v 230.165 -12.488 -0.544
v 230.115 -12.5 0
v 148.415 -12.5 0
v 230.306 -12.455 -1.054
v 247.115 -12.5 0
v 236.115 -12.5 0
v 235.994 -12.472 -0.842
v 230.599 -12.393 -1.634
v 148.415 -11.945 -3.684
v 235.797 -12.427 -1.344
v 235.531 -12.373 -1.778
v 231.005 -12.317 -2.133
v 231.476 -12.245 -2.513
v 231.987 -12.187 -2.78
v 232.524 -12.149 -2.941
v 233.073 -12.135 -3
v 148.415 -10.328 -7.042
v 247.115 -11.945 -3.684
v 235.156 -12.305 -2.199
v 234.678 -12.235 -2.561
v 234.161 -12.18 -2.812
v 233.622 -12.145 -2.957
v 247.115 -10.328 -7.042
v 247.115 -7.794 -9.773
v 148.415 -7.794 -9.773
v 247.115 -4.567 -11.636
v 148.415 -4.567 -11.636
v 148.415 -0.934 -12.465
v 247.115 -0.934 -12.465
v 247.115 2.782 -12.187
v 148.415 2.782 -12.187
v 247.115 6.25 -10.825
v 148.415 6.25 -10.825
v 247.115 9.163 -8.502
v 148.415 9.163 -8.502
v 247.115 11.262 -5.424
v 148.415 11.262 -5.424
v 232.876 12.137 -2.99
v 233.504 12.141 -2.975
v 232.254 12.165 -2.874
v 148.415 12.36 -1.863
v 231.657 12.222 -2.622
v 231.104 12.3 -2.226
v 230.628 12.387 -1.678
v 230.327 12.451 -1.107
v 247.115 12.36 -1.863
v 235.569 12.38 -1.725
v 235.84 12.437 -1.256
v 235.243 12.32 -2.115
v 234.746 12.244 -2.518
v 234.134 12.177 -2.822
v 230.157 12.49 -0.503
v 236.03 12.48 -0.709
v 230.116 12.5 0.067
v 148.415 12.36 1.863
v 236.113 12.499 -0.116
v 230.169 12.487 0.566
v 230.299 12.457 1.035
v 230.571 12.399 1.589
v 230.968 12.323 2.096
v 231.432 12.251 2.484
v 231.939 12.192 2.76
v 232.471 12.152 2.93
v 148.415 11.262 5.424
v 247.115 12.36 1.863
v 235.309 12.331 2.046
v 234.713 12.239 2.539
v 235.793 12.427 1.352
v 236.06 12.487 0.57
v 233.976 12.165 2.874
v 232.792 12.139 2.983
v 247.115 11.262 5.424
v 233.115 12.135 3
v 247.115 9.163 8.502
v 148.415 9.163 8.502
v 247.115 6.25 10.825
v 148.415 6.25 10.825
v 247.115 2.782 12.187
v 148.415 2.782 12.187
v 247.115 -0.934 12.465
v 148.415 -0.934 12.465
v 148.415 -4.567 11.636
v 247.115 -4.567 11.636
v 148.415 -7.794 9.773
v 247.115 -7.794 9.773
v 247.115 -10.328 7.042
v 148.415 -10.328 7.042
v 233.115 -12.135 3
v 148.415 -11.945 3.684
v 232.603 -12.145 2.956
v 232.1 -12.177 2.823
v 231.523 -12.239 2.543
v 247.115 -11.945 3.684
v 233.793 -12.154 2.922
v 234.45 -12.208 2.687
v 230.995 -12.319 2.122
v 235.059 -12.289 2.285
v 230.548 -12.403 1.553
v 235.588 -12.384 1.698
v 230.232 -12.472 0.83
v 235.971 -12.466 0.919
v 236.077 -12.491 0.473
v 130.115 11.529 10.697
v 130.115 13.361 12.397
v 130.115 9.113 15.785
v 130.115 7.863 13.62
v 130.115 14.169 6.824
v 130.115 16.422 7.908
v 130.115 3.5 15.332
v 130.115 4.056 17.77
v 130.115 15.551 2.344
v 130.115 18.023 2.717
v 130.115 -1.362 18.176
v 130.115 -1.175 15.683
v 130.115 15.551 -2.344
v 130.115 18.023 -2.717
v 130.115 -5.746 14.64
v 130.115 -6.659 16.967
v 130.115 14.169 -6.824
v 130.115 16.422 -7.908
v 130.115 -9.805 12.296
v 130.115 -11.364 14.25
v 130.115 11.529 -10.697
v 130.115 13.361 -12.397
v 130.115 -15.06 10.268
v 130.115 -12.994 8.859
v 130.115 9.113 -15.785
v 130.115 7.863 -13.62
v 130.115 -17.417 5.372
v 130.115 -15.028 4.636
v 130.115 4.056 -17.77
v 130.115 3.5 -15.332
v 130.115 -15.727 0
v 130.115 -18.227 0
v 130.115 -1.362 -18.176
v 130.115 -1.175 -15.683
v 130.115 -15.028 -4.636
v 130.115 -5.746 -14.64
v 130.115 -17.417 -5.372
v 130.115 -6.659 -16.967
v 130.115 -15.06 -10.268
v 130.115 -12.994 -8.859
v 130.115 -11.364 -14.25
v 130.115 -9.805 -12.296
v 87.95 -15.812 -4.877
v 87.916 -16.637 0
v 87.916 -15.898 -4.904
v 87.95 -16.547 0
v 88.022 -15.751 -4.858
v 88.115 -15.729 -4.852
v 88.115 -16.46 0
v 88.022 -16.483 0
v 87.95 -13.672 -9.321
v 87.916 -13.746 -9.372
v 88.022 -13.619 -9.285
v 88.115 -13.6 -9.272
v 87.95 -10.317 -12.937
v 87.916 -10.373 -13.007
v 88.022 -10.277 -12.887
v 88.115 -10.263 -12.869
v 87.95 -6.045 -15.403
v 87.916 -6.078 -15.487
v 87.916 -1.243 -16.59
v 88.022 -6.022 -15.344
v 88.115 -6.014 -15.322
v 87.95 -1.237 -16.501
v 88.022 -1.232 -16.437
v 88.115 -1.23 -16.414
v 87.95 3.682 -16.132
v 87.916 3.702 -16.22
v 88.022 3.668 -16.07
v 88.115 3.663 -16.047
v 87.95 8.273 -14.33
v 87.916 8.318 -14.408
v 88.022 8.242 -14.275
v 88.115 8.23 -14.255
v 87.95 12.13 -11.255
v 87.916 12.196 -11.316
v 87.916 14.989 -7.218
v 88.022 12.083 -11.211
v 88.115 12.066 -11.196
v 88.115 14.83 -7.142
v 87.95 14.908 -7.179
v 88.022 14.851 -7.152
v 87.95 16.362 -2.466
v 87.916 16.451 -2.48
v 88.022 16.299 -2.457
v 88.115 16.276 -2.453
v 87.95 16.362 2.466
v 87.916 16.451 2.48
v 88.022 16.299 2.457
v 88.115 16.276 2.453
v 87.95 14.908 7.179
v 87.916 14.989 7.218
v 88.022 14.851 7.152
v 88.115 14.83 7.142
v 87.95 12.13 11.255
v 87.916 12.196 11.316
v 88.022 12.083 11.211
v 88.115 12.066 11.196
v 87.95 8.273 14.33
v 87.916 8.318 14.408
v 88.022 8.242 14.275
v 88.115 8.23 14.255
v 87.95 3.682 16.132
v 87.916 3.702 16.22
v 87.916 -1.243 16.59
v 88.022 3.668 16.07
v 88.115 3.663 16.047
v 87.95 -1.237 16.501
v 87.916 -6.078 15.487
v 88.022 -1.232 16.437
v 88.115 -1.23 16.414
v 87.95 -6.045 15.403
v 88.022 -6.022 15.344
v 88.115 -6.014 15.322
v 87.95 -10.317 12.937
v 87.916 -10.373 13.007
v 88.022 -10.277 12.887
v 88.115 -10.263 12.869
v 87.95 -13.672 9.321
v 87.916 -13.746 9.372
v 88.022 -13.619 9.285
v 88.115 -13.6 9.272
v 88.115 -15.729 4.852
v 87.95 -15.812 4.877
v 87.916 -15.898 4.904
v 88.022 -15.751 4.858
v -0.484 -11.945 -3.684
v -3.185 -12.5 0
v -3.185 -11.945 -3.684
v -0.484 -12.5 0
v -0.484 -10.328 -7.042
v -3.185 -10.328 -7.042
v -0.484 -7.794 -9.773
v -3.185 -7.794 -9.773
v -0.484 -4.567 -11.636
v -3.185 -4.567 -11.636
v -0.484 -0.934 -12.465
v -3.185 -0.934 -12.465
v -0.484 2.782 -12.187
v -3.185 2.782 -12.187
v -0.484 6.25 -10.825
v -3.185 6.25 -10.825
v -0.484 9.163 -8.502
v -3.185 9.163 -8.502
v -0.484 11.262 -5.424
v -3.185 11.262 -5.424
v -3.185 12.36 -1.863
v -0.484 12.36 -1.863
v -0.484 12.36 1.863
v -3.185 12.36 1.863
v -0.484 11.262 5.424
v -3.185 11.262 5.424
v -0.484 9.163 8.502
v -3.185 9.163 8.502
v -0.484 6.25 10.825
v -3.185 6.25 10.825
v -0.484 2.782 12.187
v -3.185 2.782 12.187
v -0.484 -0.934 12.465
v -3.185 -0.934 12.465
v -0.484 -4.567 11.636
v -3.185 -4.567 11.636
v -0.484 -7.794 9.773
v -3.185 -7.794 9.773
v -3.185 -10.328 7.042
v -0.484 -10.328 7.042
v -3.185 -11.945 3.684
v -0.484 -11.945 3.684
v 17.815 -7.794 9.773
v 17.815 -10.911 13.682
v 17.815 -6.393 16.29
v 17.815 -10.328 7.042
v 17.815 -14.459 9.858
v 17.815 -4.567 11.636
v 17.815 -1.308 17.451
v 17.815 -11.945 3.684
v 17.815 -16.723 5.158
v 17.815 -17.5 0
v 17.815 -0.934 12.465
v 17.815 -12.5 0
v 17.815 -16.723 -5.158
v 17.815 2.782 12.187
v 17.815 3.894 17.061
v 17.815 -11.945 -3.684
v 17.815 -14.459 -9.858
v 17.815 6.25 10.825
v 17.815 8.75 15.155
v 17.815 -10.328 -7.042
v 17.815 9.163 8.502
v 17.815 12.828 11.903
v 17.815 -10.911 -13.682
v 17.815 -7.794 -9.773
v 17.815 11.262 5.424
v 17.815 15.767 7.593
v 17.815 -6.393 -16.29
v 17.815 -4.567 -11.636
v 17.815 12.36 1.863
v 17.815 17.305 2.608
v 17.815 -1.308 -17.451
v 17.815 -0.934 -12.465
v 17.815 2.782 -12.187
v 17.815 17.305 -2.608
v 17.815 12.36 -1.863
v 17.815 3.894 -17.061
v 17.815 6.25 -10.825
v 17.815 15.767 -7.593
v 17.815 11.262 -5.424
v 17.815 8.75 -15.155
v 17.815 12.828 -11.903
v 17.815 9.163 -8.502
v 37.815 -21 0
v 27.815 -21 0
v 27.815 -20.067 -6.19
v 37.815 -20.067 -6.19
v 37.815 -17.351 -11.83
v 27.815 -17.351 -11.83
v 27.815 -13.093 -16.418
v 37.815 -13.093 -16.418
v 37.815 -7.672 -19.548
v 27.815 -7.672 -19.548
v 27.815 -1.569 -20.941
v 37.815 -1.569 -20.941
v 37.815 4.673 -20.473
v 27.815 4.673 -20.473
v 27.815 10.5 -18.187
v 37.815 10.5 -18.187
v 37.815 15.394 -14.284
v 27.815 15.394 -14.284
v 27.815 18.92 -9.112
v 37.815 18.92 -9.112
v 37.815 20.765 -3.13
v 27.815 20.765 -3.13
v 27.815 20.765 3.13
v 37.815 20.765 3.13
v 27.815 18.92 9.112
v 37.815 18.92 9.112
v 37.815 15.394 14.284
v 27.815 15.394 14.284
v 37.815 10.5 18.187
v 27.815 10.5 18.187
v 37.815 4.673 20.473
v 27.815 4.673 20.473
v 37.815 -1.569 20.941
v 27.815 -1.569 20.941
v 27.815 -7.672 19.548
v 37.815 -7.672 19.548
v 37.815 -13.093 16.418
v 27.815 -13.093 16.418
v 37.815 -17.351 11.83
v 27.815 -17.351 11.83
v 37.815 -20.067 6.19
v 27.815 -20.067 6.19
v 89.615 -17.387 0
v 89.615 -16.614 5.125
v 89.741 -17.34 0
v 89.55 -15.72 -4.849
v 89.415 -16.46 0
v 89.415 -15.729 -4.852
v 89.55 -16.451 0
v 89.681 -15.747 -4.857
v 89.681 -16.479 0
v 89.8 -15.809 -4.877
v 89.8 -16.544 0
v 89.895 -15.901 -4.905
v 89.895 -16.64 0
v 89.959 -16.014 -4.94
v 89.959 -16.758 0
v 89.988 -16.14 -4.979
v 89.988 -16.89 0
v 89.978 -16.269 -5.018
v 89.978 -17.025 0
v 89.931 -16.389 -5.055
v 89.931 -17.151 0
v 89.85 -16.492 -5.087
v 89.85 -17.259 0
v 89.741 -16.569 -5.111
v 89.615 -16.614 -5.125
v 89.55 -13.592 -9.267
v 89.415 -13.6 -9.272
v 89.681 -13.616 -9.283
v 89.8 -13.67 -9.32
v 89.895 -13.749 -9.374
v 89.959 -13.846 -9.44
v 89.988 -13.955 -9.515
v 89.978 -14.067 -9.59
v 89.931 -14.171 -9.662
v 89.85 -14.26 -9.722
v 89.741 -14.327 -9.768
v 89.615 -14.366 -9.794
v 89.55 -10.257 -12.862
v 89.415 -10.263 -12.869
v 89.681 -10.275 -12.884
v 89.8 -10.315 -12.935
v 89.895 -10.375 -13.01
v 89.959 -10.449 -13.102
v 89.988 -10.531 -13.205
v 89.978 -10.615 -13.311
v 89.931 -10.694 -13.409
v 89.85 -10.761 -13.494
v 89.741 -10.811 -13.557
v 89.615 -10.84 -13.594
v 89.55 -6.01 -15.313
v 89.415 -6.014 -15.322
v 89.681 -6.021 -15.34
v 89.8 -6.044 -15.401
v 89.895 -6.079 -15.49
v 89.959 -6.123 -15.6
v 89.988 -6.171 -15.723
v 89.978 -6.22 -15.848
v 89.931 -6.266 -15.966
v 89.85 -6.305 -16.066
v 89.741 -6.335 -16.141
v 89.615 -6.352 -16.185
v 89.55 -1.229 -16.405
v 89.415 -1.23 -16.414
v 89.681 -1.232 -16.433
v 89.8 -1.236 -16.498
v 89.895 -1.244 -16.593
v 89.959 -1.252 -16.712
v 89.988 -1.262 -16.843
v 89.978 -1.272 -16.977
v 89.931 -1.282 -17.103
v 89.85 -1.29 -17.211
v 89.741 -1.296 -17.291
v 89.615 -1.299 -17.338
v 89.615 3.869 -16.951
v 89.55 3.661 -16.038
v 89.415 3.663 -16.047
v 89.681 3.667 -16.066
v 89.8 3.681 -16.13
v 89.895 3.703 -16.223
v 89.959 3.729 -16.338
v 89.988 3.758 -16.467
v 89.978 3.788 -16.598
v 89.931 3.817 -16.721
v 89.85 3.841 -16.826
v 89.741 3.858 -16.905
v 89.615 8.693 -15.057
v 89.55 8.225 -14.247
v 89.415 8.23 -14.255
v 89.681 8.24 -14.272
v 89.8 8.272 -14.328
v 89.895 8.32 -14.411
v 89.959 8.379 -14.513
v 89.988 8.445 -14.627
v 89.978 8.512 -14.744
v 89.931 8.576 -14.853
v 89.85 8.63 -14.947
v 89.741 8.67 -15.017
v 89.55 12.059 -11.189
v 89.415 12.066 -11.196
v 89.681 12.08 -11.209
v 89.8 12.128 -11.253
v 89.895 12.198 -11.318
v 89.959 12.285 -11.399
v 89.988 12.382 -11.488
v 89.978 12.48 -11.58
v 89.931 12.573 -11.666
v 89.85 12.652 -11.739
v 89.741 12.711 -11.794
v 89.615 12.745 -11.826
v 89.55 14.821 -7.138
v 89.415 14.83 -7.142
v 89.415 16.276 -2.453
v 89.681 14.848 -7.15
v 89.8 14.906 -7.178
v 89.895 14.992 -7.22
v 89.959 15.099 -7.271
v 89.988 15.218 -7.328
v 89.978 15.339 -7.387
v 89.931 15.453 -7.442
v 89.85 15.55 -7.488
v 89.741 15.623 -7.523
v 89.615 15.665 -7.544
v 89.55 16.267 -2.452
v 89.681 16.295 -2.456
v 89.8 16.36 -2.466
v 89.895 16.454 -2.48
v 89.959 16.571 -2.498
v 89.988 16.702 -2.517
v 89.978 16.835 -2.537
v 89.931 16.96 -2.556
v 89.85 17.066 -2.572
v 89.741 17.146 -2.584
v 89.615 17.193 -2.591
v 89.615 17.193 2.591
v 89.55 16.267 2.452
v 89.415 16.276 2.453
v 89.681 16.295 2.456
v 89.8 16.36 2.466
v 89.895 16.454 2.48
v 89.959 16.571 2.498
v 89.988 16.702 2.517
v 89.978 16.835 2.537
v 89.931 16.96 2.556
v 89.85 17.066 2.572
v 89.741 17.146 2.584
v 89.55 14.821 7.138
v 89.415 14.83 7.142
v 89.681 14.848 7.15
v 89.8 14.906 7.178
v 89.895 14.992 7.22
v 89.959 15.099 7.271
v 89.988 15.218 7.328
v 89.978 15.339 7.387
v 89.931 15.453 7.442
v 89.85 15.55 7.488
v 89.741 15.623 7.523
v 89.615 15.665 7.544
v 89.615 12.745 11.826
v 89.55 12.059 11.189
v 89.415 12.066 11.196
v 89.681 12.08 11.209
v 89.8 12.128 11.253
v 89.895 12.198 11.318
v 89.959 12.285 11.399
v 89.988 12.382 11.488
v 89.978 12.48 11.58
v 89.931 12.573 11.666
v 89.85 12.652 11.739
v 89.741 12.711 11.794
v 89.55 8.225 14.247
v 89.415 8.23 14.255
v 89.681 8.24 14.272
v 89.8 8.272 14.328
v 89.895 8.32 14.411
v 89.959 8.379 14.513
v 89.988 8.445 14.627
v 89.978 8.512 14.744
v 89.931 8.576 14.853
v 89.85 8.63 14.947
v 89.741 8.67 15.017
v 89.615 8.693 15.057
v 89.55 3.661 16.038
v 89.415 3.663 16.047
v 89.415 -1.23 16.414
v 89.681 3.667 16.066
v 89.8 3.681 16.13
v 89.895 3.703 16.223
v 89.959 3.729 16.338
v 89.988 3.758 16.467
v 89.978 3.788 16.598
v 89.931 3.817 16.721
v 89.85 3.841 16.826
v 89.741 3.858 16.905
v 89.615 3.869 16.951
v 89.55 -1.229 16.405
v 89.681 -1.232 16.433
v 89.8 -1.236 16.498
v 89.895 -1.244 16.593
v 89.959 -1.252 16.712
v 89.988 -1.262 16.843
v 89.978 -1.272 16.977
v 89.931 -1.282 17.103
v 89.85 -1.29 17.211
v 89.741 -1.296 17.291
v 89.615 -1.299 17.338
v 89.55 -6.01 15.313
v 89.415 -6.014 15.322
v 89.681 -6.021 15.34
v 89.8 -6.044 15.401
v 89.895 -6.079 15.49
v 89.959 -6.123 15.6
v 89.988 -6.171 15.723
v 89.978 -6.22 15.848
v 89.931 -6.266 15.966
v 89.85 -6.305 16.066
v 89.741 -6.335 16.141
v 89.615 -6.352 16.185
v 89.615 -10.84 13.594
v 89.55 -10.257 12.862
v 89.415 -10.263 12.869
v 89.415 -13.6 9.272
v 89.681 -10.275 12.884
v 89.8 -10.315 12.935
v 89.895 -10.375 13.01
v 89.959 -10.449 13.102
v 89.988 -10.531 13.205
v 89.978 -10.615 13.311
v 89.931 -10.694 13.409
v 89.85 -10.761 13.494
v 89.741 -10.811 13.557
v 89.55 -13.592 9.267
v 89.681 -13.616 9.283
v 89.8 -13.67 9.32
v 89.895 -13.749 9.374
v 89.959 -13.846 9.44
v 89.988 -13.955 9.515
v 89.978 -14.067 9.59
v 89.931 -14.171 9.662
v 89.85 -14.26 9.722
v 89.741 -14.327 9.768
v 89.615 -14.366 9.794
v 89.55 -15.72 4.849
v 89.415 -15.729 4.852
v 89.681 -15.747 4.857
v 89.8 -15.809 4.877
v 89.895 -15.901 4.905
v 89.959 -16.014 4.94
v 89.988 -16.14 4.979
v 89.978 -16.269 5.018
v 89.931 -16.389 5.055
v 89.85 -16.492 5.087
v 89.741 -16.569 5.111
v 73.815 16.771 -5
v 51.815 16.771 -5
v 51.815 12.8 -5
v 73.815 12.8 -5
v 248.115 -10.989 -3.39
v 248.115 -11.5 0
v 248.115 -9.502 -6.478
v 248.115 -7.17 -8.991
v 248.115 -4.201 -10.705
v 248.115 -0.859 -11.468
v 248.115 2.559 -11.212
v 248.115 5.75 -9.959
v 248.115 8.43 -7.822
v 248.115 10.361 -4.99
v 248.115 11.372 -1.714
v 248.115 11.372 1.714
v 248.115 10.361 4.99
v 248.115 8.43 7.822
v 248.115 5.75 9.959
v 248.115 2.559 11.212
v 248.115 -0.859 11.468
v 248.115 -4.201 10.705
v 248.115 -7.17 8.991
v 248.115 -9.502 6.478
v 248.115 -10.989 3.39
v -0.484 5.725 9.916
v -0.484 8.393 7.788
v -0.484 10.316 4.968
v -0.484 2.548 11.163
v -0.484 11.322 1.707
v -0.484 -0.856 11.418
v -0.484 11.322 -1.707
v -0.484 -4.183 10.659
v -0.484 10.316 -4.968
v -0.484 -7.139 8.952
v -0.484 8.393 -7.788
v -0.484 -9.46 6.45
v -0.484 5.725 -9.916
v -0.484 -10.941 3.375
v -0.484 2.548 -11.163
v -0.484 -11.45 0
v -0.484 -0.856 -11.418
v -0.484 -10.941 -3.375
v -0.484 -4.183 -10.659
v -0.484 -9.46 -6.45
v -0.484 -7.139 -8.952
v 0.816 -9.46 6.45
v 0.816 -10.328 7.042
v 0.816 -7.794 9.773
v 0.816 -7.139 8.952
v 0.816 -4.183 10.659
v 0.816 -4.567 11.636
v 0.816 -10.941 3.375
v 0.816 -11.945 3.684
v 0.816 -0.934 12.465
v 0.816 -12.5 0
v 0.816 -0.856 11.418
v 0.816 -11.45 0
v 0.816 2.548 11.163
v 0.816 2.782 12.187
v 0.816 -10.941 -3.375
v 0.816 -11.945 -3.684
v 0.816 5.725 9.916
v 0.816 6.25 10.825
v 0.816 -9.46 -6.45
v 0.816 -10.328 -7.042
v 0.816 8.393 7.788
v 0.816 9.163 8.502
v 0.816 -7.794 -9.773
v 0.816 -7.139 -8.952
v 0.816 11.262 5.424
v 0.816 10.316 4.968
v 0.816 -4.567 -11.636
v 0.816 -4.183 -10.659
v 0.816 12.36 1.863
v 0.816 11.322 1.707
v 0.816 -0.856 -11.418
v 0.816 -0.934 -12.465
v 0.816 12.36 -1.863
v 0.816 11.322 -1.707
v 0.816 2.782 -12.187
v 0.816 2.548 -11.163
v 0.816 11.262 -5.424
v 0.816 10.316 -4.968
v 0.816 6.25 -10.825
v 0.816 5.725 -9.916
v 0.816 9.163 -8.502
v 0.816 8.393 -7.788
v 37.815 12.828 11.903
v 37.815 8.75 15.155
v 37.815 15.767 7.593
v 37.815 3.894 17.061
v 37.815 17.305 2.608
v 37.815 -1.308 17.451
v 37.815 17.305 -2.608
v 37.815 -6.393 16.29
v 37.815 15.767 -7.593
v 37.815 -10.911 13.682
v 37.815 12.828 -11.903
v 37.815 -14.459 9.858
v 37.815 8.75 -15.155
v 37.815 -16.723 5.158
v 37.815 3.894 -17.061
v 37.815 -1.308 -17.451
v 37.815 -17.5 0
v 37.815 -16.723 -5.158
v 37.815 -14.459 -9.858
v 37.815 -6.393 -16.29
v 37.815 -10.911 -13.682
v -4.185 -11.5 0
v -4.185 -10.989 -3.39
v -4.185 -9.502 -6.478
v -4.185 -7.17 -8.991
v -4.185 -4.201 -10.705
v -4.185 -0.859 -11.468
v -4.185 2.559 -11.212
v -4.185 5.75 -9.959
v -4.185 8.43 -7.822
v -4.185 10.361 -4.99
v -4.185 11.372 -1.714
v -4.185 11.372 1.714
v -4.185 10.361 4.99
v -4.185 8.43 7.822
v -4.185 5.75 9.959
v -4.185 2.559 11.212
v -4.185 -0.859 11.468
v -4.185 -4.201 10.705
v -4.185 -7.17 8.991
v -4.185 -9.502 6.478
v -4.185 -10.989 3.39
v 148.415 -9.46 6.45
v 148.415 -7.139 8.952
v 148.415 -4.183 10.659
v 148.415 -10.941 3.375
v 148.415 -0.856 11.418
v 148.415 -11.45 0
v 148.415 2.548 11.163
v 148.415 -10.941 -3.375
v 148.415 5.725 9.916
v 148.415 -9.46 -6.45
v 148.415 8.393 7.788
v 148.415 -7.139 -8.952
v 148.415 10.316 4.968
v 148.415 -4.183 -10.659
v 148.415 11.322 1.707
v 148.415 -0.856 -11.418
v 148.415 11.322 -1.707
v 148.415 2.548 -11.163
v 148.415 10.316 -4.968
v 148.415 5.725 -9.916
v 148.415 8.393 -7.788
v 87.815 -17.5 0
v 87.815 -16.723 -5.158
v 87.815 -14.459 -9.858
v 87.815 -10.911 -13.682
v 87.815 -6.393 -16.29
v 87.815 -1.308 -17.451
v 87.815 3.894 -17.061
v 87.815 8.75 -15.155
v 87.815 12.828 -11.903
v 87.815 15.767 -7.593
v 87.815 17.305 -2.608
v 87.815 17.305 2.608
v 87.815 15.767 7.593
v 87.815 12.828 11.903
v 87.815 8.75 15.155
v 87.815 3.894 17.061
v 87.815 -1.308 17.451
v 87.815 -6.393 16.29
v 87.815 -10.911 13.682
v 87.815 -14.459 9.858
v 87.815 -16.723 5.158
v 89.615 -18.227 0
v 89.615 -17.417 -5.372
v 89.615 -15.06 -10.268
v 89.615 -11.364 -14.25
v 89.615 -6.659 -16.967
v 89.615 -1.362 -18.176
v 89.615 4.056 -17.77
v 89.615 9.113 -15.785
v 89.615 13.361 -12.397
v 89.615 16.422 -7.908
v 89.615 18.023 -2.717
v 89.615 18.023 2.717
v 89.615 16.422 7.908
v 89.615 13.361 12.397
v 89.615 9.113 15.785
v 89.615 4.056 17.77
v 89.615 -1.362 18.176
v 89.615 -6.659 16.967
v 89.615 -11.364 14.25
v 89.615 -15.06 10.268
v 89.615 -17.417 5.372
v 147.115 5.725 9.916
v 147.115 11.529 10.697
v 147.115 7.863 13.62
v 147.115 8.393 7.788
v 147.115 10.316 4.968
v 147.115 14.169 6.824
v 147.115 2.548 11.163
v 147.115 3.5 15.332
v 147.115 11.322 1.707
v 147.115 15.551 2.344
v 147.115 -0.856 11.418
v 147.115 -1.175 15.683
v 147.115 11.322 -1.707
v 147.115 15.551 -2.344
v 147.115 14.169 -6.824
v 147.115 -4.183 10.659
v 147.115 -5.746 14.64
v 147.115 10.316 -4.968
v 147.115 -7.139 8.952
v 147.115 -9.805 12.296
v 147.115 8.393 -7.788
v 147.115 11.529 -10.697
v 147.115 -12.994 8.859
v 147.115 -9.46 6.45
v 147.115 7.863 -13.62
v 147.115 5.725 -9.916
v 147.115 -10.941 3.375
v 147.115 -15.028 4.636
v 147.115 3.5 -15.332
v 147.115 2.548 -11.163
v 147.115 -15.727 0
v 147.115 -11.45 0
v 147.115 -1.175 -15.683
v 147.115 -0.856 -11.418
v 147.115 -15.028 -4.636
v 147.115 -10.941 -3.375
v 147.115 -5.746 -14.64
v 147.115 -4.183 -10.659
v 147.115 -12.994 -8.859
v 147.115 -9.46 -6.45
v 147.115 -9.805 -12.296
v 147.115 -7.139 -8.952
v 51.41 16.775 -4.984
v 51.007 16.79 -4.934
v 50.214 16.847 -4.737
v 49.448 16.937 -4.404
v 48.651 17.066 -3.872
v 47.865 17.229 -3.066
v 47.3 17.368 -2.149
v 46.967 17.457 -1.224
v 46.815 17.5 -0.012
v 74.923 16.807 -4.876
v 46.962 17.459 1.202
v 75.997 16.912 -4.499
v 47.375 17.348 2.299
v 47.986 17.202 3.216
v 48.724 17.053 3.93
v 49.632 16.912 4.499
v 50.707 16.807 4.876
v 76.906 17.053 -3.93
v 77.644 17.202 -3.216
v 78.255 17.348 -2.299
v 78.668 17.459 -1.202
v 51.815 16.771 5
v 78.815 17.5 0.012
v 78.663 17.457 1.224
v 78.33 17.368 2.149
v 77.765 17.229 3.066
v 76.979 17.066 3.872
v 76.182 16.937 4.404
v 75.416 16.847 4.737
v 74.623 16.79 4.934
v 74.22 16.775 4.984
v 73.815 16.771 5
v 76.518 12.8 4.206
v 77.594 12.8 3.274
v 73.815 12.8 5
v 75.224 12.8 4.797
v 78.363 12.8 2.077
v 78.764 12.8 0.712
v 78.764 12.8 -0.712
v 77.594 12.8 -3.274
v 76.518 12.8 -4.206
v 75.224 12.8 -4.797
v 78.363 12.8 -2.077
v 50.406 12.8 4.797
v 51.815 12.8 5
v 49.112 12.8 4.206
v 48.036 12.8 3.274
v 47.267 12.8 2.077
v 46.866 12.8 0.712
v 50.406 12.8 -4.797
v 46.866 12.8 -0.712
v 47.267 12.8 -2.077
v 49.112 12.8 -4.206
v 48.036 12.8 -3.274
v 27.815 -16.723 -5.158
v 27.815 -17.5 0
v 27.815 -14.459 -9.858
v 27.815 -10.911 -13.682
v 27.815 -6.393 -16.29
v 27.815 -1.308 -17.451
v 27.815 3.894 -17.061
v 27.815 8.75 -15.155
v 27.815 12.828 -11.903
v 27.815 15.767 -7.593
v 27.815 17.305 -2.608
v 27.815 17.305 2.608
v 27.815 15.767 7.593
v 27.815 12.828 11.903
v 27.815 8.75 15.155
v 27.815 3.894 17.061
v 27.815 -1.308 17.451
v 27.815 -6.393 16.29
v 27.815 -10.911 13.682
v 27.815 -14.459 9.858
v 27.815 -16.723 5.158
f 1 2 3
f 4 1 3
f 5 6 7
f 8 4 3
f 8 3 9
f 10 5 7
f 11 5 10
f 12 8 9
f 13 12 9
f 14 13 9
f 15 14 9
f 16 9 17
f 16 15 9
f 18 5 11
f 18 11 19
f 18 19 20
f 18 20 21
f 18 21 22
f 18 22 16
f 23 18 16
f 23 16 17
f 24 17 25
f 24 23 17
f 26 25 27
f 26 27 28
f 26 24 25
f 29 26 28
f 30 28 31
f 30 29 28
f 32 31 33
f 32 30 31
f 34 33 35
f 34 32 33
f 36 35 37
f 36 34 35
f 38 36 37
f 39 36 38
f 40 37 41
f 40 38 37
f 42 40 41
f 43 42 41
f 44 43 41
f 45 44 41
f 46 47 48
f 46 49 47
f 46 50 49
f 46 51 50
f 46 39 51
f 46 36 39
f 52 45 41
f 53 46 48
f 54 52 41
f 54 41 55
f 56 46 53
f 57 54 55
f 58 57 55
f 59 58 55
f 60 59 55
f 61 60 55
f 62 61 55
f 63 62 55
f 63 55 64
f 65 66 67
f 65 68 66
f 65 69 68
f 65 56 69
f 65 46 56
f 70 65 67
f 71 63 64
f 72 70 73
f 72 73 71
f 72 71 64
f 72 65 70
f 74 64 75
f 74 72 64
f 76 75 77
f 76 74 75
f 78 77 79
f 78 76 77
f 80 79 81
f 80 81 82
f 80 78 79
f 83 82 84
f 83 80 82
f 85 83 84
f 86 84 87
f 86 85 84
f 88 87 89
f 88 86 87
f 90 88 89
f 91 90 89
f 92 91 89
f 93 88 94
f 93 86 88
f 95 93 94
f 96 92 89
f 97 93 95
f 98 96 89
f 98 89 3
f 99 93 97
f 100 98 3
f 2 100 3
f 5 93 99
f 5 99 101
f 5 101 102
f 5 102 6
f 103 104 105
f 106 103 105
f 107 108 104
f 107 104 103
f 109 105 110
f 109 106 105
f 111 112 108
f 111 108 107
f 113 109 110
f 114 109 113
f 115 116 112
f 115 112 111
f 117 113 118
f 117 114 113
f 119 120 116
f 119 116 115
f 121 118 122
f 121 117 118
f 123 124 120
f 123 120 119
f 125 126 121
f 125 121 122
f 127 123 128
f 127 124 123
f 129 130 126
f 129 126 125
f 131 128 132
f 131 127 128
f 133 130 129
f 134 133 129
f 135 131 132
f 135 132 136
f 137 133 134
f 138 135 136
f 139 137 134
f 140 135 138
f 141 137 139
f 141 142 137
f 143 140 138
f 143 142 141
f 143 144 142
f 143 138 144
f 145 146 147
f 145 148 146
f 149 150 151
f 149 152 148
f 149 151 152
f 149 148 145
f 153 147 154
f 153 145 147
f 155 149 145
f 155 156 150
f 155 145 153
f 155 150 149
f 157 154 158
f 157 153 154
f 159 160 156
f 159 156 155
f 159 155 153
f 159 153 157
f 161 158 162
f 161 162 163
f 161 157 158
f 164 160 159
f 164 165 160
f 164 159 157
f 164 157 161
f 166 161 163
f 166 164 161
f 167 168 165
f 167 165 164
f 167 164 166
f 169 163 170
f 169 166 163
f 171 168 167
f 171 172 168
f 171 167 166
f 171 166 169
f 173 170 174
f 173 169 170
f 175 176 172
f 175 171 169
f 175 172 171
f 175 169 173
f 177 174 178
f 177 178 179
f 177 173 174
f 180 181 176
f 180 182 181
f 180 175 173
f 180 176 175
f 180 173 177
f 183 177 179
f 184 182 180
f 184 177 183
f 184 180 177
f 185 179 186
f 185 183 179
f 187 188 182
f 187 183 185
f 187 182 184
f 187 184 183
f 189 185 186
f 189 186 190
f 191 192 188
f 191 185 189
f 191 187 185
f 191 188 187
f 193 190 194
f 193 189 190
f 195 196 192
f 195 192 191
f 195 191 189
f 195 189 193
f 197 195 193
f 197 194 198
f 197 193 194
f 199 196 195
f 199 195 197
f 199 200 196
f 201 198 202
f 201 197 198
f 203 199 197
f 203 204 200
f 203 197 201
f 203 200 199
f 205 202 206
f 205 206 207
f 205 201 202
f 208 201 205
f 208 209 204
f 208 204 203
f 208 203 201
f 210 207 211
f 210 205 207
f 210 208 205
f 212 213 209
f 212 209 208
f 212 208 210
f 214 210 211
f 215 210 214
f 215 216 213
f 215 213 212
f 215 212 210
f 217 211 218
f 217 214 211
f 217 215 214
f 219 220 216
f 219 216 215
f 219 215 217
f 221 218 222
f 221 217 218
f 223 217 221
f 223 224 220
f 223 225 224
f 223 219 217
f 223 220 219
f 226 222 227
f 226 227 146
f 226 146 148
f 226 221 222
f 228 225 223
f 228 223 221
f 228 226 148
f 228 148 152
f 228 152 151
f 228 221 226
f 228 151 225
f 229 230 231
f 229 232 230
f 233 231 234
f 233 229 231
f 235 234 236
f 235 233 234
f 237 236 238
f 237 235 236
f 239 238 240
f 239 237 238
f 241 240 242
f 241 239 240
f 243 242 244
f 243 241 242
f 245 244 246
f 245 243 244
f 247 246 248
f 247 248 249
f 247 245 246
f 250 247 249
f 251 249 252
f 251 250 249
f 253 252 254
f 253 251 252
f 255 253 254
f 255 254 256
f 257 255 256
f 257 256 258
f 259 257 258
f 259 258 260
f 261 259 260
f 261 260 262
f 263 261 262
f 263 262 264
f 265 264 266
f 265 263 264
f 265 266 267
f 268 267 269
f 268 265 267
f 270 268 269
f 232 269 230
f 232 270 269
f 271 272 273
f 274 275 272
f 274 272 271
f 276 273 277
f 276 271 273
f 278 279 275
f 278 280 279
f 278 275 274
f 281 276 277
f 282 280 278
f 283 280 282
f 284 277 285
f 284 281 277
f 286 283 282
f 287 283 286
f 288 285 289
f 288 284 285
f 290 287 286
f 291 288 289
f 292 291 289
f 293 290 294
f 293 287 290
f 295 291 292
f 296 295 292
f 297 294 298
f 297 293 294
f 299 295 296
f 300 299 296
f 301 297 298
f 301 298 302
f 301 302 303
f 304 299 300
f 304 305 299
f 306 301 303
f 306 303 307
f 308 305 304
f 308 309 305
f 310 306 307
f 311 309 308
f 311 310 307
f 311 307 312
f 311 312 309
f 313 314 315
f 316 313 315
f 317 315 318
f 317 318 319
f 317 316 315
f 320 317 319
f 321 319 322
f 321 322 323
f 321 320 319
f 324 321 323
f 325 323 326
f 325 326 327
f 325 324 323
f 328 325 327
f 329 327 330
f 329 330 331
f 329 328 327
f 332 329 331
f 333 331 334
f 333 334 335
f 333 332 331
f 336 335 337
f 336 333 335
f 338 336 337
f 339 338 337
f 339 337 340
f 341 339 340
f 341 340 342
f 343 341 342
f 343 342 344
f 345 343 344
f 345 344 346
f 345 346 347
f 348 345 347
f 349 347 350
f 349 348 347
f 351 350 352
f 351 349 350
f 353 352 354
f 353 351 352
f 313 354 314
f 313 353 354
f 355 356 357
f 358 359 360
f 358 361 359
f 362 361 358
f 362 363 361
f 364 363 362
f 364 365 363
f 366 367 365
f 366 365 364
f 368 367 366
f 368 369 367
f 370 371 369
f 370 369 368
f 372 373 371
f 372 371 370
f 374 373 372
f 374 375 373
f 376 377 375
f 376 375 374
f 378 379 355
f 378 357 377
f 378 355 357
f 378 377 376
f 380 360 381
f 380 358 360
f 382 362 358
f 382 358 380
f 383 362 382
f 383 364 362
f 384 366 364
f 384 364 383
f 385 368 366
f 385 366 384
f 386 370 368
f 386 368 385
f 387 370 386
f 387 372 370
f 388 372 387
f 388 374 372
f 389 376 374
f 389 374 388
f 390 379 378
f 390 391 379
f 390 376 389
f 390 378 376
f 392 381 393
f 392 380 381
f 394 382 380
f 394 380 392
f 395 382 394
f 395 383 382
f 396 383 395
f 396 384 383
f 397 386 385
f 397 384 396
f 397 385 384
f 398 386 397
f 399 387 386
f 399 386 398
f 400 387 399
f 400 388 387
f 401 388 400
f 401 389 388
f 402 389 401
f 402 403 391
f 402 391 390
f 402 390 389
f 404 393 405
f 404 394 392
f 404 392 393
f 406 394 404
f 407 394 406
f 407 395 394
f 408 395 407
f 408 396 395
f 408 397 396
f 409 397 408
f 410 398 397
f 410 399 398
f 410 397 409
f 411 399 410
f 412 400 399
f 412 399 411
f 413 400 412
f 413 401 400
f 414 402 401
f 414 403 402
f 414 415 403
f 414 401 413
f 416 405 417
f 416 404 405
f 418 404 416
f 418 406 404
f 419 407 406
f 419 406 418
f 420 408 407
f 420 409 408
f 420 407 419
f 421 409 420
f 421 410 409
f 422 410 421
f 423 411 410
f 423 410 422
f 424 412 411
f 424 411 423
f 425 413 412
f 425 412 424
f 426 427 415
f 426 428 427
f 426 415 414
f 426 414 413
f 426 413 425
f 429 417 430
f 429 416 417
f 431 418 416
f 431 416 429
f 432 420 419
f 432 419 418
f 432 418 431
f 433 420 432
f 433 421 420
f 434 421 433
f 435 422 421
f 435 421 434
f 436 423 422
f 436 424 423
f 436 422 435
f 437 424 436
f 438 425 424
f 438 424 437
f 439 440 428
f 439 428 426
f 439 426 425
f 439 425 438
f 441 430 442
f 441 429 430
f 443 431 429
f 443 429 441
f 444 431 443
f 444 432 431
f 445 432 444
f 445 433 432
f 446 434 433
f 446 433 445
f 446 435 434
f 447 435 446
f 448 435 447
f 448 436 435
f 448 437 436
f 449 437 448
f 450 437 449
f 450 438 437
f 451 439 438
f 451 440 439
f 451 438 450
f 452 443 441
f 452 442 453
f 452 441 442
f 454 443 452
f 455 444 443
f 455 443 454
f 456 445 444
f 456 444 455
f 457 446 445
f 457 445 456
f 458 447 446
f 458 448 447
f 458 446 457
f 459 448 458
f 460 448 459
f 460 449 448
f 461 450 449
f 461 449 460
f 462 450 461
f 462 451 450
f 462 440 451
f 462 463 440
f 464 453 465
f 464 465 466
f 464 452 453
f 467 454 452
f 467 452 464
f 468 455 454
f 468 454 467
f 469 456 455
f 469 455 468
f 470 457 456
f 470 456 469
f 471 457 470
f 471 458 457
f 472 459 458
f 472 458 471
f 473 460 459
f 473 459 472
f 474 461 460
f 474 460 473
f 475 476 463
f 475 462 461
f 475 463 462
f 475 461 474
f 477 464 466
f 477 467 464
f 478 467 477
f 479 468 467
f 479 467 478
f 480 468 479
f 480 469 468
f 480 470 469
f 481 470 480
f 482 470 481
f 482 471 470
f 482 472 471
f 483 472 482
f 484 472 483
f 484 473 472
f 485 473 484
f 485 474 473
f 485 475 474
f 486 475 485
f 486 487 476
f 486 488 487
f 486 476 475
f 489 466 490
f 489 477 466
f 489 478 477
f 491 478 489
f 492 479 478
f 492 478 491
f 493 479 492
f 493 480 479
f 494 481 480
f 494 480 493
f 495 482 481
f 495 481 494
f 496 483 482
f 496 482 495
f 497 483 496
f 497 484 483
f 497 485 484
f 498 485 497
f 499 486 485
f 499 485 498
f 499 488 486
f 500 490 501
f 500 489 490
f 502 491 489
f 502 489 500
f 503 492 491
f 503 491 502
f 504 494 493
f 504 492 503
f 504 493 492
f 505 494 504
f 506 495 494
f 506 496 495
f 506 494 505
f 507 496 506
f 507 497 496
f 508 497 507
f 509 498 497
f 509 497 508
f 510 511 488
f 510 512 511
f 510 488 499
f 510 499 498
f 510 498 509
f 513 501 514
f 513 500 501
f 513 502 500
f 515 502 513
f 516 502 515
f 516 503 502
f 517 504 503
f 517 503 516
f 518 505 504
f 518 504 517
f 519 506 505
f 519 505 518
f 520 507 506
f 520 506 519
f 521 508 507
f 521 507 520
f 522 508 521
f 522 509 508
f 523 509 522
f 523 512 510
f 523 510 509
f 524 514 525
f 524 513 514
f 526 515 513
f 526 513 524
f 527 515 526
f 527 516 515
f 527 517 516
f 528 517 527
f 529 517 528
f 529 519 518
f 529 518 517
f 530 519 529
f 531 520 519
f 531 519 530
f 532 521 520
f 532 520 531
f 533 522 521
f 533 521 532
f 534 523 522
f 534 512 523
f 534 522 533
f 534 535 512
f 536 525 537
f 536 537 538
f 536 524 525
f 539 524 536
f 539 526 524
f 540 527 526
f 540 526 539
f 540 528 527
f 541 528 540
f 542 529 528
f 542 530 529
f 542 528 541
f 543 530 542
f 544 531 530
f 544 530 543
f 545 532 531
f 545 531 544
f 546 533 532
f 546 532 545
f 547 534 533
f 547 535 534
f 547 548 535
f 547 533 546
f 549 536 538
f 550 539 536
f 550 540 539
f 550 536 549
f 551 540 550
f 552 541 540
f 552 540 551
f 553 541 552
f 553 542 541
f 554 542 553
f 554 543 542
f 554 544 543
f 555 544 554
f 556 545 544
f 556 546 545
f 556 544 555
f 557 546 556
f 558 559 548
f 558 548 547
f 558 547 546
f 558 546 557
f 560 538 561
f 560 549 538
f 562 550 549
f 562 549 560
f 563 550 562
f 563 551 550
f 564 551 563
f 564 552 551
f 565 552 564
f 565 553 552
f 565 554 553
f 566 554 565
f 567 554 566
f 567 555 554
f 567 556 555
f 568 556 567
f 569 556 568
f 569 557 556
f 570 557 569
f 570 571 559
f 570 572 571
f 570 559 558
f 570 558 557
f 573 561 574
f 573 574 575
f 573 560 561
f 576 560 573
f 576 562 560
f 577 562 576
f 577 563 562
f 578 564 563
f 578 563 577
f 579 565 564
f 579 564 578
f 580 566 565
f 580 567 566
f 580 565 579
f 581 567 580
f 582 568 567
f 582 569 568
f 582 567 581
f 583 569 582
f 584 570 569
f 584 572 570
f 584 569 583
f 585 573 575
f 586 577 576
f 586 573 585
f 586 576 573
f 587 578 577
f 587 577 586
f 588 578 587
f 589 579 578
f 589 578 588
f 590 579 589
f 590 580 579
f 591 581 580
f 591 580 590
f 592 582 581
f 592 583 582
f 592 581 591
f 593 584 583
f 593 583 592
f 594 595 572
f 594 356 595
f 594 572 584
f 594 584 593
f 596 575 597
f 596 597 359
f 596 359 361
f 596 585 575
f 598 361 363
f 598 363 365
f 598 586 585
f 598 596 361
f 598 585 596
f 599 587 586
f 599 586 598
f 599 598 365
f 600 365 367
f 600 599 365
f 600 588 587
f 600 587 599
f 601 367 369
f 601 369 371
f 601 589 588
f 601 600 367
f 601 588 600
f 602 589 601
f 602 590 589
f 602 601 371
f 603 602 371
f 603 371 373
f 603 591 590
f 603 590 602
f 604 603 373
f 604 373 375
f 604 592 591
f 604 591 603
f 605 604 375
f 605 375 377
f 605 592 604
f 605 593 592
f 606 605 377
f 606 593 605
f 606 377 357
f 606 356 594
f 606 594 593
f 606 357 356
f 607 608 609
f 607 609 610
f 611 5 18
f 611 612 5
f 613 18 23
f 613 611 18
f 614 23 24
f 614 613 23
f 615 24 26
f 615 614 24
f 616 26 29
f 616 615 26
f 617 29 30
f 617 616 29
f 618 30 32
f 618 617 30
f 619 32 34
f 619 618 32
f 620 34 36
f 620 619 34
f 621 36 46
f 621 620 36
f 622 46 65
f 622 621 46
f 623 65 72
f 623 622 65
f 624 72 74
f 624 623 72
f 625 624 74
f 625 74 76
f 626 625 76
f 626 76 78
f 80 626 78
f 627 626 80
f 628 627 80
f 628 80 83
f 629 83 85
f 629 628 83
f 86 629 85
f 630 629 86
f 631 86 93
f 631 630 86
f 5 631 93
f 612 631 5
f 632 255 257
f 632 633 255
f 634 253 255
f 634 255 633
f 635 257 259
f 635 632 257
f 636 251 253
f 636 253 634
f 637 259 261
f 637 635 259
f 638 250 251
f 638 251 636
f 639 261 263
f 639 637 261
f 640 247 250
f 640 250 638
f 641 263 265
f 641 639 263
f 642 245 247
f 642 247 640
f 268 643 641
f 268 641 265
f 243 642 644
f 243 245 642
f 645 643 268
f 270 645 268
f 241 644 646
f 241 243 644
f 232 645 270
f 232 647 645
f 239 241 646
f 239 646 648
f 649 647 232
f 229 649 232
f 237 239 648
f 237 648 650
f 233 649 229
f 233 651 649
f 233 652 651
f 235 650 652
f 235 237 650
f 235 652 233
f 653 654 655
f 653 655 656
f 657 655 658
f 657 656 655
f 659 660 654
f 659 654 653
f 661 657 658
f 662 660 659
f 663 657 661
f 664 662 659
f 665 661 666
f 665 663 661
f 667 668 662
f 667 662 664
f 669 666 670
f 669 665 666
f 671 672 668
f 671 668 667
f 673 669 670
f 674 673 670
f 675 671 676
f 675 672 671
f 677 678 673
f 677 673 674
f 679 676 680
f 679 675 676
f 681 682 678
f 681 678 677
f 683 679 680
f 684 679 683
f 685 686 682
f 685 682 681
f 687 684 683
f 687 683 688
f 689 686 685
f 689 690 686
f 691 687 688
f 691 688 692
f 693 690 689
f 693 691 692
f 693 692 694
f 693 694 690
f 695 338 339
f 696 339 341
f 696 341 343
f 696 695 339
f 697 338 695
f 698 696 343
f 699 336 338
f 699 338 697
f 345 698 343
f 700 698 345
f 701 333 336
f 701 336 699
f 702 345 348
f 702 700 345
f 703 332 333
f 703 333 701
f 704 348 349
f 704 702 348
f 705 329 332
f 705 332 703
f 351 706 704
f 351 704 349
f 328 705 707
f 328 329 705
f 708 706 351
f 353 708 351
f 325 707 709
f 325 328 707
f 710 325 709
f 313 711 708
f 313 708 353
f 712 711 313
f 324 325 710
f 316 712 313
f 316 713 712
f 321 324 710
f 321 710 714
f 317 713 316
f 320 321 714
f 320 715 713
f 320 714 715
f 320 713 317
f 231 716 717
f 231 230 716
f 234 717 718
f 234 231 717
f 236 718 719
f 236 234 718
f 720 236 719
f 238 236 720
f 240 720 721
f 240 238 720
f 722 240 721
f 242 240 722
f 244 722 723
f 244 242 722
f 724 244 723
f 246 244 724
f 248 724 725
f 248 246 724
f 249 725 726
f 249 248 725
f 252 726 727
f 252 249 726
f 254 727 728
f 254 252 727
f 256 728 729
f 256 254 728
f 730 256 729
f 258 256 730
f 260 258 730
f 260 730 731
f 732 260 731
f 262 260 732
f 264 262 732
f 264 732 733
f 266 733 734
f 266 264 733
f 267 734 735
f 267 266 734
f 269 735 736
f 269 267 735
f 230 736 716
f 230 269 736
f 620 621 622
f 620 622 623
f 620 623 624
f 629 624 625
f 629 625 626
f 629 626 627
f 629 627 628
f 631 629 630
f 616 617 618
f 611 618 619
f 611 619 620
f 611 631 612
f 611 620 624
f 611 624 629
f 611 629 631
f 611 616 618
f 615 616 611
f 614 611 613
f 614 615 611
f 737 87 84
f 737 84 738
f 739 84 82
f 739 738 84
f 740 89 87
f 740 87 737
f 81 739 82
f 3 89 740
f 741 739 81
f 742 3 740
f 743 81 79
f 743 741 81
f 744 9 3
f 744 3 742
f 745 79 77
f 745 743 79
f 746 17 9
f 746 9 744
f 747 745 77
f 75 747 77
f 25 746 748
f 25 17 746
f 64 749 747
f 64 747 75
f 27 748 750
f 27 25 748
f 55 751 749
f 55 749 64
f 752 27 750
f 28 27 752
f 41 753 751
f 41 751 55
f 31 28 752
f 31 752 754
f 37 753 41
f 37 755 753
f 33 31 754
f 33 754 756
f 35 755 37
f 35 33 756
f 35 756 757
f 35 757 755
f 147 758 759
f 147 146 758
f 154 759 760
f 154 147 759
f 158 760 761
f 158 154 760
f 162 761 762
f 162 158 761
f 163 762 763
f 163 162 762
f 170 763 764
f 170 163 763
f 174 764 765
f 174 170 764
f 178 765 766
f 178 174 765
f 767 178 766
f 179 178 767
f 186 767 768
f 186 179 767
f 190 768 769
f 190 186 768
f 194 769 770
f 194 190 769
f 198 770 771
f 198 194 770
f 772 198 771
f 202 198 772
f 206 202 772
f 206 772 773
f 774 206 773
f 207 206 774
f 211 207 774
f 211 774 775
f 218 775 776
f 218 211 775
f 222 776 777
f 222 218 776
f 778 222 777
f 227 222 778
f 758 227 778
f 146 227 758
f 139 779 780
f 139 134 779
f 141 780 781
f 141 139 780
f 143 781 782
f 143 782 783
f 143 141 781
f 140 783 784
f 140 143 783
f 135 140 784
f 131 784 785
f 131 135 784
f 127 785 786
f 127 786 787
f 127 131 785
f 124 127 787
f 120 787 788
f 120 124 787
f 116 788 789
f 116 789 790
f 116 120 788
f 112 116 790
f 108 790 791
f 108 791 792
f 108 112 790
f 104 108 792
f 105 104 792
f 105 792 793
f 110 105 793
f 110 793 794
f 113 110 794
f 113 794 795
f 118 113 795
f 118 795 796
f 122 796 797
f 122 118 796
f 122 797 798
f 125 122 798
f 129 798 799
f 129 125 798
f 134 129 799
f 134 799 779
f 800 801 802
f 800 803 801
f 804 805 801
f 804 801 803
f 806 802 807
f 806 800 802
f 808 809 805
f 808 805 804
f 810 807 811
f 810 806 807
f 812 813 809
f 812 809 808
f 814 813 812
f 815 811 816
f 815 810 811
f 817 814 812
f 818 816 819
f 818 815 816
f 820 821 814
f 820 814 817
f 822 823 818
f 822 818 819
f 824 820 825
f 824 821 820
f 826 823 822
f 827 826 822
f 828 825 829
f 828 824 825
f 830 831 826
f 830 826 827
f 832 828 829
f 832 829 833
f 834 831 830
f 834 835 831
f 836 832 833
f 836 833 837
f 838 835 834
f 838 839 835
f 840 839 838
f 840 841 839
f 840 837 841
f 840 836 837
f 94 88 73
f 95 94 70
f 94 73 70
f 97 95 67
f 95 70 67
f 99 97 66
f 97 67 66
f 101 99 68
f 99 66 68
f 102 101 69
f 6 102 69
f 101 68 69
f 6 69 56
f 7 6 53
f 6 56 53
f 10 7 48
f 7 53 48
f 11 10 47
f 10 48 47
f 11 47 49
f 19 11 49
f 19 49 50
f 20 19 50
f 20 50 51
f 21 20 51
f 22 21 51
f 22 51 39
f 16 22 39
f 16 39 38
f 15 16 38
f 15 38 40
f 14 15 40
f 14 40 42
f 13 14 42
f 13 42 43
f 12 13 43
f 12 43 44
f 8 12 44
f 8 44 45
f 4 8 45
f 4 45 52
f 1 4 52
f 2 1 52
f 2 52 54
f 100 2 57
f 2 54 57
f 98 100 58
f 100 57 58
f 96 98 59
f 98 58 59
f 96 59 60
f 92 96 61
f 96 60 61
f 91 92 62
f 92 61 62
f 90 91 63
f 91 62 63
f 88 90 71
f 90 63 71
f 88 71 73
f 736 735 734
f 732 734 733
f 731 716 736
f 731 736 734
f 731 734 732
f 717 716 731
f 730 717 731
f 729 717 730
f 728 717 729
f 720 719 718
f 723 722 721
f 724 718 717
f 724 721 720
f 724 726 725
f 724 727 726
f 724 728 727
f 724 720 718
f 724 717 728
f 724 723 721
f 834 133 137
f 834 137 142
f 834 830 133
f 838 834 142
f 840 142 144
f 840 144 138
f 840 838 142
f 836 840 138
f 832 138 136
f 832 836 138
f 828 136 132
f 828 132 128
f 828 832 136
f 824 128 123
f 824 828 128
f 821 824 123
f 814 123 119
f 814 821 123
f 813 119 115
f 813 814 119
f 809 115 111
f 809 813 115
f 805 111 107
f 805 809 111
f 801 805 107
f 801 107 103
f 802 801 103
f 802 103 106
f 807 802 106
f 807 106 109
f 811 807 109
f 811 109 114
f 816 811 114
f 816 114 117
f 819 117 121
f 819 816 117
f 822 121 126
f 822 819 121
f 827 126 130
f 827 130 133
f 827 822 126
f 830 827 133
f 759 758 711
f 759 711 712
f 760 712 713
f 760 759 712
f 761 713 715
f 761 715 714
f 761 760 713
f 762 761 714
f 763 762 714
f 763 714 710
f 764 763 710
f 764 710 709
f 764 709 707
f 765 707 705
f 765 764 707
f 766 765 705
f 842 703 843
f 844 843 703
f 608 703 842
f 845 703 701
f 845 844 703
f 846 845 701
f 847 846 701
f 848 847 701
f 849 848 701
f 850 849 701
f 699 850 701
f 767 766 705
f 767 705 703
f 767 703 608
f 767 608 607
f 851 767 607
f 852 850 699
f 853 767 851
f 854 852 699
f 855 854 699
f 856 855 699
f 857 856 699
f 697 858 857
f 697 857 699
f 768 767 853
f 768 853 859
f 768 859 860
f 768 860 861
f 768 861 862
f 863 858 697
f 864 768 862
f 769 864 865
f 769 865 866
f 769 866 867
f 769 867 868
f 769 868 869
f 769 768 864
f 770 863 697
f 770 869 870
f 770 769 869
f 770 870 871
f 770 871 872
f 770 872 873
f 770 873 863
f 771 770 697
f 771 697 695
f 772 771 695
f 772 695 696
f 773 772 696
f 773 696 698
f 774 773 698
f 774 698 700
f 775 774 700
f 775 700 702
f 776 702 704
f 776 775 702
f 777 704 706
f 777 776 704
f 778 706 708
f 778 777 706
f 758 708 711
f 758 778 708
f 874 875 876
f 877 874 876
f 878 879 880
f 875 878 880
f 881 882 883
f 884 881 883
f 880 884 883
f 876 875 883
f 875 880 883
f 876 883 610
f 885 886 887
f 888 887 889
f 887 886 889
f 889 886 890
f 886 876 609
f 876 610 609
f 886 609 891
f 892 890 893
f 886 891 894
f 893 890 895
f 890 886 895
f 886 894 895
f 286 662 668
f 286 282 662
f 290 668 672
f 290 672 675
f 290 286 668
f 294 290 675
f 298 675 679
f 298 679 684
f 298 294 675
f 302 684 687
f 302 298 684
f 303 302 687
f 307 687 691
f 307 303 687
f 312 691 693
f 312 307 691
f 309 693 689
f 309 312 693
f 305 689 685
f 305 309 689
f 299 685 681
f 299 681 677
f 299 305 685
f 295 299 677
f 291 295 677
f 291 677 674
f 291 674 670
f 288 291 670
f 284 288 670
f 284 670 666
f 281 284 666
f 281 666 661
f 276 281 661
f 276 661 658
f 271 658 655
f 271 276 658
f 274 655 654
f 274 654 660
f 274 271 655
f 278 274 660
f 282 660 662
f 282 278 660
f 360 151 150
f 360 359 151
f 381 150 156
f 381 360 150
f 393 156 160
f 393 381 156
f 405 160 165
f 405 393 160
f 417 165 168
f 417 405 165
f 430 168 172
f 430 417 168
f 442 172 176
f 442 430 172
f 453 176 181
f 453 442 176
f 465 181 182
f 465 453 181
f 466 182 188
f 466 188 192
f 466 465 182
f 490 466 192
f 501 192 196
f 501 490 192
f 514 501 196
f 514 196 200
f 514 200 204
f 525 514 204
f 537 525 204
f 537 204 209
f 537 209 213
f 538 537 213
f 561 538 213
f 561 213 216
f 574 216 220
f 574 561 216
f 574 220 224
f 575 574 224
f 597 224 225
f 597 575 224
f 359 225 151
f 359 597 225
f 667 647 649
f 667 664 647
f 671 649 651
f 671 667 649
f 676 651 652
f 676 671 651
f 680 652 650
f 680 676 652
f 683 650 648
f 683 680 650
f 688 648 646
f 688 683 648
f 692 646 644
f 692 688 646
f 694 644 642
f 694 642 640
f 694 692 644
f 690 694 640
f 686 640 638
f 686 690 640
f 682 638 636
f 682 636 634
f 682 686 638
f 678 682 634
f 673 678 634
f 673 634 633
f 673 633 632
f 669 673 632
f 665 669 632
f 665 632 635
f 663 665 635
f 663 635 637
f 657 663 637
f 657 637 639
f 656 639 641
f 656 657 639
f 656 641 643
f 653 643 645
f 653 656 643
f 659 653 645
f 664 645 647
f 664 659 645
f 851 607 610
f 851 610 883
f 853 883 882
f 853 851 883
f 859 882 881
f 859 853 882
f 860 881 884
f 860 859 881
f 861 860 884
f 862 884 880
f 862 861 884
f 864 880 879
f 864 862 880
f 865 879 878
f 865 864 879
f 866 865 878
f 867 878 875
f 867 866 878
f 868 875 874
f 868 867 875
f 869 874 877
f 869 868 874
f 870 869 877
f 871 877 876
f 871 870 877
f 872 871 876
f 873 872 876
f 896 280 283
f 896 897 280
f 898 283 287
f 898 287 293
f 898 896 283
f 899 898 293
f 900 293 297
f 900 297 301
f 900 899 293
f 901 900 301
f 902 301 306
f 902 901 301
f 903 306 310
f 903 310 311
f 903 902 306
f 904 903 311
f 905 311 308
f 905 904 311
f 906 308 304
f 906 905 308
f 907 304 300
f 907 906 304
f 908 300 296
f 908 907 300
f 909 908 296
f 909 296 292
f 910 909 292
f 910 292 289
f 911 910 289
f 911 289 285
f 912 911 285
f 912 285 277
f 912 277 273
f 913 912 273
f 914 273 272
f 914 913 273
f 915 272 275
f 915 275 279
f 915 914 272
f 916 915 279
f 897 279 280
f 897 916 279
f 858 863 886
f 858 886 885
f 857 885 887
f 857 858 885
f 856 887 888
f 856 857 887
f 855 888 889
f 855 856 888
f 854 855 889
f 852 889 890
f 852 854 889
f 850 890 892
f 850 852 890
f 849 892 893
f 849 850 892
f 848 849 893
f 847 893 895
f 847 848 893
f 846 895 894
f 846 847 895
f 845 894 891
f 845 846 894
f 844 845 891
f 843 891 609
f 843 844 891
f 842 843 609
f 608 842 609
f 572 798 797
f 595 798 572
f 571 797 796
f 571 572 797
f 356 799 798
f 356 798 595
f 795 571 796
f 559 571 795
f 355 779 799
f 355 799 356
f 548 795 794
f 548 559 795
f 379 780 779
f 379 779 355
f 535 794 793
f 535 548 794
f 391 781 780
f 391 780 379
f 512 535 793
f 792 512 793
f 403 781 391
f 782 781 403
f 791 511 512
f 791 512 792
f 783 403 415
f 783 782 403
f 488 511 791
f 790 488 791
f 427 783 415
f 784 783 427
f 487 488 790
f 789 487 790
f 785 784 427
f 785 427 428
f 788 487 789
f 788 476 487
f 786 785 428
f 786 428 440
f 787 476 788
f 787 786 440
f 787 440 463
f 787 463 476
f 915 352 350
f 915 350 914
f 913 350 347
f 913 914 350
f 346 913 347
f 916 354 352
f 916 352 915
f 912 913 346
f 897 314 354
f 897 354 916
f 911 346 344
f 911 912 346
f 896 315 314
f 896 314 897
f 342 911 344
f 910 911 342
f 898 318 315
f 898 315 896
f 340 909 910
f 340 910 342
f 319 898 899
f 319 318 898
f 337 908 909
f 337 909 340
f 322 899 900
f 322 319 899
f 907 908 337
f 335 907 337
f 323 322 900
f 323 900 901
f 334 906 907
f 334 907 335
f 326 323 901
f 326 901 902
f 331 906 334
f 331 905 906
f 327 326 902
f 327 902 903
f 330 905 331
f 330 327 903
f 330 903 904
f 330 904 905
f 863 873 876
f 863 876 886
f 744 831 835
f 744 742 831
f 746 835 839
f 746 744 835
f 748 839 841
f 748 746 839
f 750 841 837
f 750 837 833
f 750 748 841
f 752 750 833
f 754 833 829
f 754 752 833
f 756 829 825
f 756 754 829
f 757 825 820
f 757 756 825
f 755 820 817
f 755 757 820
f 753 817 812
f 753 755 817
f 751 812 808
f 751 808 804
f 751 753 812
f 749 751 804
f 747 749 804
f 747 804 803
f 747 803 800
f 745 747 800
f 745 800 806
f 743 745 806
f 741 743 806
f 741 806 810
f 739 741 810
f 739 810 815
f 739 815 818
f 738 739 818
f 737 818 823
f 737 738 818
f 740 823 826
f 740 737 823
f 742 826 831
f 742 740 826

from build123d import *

# Parameters (mm, degrees)
CUT_EXTRUDE2_START = 18
CUT_EXTRUDE2_DEPTH = 5.2
SKETCH4_R          = 3
CUT_EXTRUDE3_DEPTH = 20


with BuildPart() as part:
    # Sketch1 → Revolve1 (revolve)
    with BuildSketch(Plane.XY):
        with BuildLine():
            Line((-4.185051691, 0), (-4.185051691, 11.5))
            Line((-4.185051691, 11.5), (-3.185051691, 12.5))
            Line((-3.185051691, 12.5), (-0.484378869, 12.5))
            Line((-0.484378869, 12.5), (-0.484378869, 11.45))
            Line((-0.484378869, 11.45), (0.815621131, 11.45))
            Line((0.815621131, 11.45), (0.815621131, 12.5))
            Line((0.815621131, 12.5), (17.814948309, 12.5))
            Line((17.814948309, 12.5), (17.814948309, 17.5))
            Line((17.814948309, 17.5), (27.814948309, 17.5))
            Line((27.814948309, 17.5), (27.814948309, 21))
            Line((27.814948309, 21), (37.814948309, 21))
            Line((37.814948309, 21), (37.814948309, 17.5))
            Line((37.814948309, 17.5), (87.814948309, 17.5))
            Line((87.814948309, 17.5), (87.916312777, 16.636677786))
            ThreePointArc((87.916312777, 16.636677786), (87.982028112, 16.510560309), (88.114948309, 16.46))
            Line((88.114948309, 16.46), (89.414948309, 16.46))
            ThreePointArc((89.414948309, 16.46), (89.978347351, 16.823399043), (89.614948309, 17.386798085))
            Line((89.614948309, 17.386798085), (89.614948309, 18.226798085))
            Line((89.614948309, 18.226798085), (130.114948309, 18.226798085))
            Line((130.114948309, 18.226798085), (130.114948309, 15.726798085))
            Line((130.114948309, 15.726798085), (147.114948309, 15.726798085))
            Line((147.114948309, 15.726798085), (147.114948309, 11.45))
            Line((147.114948309, 11.45), (148.414948309, 11.45))
            Line((148.414948309, 11.45), (148.414948309, 12.5))
            Line((148.414948309, 12.5), (247.114948309, 12.5))
            Line((247.114948309, 12.5), (248.114948309, 11.5))
            Line((248.114948309, 11.5), (248.114948309, 0))
            Line((248.114948309, 0), (-4.185051691, 0))
        make_face()
    revolve(axis=Axis((-15.310878374, 0, 0), (1, 0, 0)))

    # Sketch3 → Cut-Extrude2 (cut)
    with BuildSketch(Plane(origin=(0, 0, 0), x_dir=(1, 0, 0), z_dir=(0, 1, 0)).offset(CUT_EXTRUDE2_START)):
        with BuildLine():
            Line((51.814948309, 5), (73.814948309, 5))
            ThreePointArc((73.814948309, 5), (78.814948309, 0), (73.814948309, -5))
            Line((73.814948309, -5), (51.814948309, -5))
            ThreePointArc((51.814948309, -5), (46.814948309, 0), (51.814948309, 5))
        make_face()
    extrude(amount=-CUT_EXTRUDE2_DEPTH, mode=Mode.SUBTRACT)

    # Sketch4 → Cut-Extrude3 (cut, symmetric)
    with BuildSketch(Plane(origin=(0, 0, 0), x_dir=(1, 0, 0), z_dir=(0, 1, 0))):
        with Locations((233.114948309, 0)):
            Circle(SKETCH4_R)
    extrude(amount=CUT_EXTRUDE3_DEPTH, both=True, mode=Mode.SUBTRACT)


solid = part.part
